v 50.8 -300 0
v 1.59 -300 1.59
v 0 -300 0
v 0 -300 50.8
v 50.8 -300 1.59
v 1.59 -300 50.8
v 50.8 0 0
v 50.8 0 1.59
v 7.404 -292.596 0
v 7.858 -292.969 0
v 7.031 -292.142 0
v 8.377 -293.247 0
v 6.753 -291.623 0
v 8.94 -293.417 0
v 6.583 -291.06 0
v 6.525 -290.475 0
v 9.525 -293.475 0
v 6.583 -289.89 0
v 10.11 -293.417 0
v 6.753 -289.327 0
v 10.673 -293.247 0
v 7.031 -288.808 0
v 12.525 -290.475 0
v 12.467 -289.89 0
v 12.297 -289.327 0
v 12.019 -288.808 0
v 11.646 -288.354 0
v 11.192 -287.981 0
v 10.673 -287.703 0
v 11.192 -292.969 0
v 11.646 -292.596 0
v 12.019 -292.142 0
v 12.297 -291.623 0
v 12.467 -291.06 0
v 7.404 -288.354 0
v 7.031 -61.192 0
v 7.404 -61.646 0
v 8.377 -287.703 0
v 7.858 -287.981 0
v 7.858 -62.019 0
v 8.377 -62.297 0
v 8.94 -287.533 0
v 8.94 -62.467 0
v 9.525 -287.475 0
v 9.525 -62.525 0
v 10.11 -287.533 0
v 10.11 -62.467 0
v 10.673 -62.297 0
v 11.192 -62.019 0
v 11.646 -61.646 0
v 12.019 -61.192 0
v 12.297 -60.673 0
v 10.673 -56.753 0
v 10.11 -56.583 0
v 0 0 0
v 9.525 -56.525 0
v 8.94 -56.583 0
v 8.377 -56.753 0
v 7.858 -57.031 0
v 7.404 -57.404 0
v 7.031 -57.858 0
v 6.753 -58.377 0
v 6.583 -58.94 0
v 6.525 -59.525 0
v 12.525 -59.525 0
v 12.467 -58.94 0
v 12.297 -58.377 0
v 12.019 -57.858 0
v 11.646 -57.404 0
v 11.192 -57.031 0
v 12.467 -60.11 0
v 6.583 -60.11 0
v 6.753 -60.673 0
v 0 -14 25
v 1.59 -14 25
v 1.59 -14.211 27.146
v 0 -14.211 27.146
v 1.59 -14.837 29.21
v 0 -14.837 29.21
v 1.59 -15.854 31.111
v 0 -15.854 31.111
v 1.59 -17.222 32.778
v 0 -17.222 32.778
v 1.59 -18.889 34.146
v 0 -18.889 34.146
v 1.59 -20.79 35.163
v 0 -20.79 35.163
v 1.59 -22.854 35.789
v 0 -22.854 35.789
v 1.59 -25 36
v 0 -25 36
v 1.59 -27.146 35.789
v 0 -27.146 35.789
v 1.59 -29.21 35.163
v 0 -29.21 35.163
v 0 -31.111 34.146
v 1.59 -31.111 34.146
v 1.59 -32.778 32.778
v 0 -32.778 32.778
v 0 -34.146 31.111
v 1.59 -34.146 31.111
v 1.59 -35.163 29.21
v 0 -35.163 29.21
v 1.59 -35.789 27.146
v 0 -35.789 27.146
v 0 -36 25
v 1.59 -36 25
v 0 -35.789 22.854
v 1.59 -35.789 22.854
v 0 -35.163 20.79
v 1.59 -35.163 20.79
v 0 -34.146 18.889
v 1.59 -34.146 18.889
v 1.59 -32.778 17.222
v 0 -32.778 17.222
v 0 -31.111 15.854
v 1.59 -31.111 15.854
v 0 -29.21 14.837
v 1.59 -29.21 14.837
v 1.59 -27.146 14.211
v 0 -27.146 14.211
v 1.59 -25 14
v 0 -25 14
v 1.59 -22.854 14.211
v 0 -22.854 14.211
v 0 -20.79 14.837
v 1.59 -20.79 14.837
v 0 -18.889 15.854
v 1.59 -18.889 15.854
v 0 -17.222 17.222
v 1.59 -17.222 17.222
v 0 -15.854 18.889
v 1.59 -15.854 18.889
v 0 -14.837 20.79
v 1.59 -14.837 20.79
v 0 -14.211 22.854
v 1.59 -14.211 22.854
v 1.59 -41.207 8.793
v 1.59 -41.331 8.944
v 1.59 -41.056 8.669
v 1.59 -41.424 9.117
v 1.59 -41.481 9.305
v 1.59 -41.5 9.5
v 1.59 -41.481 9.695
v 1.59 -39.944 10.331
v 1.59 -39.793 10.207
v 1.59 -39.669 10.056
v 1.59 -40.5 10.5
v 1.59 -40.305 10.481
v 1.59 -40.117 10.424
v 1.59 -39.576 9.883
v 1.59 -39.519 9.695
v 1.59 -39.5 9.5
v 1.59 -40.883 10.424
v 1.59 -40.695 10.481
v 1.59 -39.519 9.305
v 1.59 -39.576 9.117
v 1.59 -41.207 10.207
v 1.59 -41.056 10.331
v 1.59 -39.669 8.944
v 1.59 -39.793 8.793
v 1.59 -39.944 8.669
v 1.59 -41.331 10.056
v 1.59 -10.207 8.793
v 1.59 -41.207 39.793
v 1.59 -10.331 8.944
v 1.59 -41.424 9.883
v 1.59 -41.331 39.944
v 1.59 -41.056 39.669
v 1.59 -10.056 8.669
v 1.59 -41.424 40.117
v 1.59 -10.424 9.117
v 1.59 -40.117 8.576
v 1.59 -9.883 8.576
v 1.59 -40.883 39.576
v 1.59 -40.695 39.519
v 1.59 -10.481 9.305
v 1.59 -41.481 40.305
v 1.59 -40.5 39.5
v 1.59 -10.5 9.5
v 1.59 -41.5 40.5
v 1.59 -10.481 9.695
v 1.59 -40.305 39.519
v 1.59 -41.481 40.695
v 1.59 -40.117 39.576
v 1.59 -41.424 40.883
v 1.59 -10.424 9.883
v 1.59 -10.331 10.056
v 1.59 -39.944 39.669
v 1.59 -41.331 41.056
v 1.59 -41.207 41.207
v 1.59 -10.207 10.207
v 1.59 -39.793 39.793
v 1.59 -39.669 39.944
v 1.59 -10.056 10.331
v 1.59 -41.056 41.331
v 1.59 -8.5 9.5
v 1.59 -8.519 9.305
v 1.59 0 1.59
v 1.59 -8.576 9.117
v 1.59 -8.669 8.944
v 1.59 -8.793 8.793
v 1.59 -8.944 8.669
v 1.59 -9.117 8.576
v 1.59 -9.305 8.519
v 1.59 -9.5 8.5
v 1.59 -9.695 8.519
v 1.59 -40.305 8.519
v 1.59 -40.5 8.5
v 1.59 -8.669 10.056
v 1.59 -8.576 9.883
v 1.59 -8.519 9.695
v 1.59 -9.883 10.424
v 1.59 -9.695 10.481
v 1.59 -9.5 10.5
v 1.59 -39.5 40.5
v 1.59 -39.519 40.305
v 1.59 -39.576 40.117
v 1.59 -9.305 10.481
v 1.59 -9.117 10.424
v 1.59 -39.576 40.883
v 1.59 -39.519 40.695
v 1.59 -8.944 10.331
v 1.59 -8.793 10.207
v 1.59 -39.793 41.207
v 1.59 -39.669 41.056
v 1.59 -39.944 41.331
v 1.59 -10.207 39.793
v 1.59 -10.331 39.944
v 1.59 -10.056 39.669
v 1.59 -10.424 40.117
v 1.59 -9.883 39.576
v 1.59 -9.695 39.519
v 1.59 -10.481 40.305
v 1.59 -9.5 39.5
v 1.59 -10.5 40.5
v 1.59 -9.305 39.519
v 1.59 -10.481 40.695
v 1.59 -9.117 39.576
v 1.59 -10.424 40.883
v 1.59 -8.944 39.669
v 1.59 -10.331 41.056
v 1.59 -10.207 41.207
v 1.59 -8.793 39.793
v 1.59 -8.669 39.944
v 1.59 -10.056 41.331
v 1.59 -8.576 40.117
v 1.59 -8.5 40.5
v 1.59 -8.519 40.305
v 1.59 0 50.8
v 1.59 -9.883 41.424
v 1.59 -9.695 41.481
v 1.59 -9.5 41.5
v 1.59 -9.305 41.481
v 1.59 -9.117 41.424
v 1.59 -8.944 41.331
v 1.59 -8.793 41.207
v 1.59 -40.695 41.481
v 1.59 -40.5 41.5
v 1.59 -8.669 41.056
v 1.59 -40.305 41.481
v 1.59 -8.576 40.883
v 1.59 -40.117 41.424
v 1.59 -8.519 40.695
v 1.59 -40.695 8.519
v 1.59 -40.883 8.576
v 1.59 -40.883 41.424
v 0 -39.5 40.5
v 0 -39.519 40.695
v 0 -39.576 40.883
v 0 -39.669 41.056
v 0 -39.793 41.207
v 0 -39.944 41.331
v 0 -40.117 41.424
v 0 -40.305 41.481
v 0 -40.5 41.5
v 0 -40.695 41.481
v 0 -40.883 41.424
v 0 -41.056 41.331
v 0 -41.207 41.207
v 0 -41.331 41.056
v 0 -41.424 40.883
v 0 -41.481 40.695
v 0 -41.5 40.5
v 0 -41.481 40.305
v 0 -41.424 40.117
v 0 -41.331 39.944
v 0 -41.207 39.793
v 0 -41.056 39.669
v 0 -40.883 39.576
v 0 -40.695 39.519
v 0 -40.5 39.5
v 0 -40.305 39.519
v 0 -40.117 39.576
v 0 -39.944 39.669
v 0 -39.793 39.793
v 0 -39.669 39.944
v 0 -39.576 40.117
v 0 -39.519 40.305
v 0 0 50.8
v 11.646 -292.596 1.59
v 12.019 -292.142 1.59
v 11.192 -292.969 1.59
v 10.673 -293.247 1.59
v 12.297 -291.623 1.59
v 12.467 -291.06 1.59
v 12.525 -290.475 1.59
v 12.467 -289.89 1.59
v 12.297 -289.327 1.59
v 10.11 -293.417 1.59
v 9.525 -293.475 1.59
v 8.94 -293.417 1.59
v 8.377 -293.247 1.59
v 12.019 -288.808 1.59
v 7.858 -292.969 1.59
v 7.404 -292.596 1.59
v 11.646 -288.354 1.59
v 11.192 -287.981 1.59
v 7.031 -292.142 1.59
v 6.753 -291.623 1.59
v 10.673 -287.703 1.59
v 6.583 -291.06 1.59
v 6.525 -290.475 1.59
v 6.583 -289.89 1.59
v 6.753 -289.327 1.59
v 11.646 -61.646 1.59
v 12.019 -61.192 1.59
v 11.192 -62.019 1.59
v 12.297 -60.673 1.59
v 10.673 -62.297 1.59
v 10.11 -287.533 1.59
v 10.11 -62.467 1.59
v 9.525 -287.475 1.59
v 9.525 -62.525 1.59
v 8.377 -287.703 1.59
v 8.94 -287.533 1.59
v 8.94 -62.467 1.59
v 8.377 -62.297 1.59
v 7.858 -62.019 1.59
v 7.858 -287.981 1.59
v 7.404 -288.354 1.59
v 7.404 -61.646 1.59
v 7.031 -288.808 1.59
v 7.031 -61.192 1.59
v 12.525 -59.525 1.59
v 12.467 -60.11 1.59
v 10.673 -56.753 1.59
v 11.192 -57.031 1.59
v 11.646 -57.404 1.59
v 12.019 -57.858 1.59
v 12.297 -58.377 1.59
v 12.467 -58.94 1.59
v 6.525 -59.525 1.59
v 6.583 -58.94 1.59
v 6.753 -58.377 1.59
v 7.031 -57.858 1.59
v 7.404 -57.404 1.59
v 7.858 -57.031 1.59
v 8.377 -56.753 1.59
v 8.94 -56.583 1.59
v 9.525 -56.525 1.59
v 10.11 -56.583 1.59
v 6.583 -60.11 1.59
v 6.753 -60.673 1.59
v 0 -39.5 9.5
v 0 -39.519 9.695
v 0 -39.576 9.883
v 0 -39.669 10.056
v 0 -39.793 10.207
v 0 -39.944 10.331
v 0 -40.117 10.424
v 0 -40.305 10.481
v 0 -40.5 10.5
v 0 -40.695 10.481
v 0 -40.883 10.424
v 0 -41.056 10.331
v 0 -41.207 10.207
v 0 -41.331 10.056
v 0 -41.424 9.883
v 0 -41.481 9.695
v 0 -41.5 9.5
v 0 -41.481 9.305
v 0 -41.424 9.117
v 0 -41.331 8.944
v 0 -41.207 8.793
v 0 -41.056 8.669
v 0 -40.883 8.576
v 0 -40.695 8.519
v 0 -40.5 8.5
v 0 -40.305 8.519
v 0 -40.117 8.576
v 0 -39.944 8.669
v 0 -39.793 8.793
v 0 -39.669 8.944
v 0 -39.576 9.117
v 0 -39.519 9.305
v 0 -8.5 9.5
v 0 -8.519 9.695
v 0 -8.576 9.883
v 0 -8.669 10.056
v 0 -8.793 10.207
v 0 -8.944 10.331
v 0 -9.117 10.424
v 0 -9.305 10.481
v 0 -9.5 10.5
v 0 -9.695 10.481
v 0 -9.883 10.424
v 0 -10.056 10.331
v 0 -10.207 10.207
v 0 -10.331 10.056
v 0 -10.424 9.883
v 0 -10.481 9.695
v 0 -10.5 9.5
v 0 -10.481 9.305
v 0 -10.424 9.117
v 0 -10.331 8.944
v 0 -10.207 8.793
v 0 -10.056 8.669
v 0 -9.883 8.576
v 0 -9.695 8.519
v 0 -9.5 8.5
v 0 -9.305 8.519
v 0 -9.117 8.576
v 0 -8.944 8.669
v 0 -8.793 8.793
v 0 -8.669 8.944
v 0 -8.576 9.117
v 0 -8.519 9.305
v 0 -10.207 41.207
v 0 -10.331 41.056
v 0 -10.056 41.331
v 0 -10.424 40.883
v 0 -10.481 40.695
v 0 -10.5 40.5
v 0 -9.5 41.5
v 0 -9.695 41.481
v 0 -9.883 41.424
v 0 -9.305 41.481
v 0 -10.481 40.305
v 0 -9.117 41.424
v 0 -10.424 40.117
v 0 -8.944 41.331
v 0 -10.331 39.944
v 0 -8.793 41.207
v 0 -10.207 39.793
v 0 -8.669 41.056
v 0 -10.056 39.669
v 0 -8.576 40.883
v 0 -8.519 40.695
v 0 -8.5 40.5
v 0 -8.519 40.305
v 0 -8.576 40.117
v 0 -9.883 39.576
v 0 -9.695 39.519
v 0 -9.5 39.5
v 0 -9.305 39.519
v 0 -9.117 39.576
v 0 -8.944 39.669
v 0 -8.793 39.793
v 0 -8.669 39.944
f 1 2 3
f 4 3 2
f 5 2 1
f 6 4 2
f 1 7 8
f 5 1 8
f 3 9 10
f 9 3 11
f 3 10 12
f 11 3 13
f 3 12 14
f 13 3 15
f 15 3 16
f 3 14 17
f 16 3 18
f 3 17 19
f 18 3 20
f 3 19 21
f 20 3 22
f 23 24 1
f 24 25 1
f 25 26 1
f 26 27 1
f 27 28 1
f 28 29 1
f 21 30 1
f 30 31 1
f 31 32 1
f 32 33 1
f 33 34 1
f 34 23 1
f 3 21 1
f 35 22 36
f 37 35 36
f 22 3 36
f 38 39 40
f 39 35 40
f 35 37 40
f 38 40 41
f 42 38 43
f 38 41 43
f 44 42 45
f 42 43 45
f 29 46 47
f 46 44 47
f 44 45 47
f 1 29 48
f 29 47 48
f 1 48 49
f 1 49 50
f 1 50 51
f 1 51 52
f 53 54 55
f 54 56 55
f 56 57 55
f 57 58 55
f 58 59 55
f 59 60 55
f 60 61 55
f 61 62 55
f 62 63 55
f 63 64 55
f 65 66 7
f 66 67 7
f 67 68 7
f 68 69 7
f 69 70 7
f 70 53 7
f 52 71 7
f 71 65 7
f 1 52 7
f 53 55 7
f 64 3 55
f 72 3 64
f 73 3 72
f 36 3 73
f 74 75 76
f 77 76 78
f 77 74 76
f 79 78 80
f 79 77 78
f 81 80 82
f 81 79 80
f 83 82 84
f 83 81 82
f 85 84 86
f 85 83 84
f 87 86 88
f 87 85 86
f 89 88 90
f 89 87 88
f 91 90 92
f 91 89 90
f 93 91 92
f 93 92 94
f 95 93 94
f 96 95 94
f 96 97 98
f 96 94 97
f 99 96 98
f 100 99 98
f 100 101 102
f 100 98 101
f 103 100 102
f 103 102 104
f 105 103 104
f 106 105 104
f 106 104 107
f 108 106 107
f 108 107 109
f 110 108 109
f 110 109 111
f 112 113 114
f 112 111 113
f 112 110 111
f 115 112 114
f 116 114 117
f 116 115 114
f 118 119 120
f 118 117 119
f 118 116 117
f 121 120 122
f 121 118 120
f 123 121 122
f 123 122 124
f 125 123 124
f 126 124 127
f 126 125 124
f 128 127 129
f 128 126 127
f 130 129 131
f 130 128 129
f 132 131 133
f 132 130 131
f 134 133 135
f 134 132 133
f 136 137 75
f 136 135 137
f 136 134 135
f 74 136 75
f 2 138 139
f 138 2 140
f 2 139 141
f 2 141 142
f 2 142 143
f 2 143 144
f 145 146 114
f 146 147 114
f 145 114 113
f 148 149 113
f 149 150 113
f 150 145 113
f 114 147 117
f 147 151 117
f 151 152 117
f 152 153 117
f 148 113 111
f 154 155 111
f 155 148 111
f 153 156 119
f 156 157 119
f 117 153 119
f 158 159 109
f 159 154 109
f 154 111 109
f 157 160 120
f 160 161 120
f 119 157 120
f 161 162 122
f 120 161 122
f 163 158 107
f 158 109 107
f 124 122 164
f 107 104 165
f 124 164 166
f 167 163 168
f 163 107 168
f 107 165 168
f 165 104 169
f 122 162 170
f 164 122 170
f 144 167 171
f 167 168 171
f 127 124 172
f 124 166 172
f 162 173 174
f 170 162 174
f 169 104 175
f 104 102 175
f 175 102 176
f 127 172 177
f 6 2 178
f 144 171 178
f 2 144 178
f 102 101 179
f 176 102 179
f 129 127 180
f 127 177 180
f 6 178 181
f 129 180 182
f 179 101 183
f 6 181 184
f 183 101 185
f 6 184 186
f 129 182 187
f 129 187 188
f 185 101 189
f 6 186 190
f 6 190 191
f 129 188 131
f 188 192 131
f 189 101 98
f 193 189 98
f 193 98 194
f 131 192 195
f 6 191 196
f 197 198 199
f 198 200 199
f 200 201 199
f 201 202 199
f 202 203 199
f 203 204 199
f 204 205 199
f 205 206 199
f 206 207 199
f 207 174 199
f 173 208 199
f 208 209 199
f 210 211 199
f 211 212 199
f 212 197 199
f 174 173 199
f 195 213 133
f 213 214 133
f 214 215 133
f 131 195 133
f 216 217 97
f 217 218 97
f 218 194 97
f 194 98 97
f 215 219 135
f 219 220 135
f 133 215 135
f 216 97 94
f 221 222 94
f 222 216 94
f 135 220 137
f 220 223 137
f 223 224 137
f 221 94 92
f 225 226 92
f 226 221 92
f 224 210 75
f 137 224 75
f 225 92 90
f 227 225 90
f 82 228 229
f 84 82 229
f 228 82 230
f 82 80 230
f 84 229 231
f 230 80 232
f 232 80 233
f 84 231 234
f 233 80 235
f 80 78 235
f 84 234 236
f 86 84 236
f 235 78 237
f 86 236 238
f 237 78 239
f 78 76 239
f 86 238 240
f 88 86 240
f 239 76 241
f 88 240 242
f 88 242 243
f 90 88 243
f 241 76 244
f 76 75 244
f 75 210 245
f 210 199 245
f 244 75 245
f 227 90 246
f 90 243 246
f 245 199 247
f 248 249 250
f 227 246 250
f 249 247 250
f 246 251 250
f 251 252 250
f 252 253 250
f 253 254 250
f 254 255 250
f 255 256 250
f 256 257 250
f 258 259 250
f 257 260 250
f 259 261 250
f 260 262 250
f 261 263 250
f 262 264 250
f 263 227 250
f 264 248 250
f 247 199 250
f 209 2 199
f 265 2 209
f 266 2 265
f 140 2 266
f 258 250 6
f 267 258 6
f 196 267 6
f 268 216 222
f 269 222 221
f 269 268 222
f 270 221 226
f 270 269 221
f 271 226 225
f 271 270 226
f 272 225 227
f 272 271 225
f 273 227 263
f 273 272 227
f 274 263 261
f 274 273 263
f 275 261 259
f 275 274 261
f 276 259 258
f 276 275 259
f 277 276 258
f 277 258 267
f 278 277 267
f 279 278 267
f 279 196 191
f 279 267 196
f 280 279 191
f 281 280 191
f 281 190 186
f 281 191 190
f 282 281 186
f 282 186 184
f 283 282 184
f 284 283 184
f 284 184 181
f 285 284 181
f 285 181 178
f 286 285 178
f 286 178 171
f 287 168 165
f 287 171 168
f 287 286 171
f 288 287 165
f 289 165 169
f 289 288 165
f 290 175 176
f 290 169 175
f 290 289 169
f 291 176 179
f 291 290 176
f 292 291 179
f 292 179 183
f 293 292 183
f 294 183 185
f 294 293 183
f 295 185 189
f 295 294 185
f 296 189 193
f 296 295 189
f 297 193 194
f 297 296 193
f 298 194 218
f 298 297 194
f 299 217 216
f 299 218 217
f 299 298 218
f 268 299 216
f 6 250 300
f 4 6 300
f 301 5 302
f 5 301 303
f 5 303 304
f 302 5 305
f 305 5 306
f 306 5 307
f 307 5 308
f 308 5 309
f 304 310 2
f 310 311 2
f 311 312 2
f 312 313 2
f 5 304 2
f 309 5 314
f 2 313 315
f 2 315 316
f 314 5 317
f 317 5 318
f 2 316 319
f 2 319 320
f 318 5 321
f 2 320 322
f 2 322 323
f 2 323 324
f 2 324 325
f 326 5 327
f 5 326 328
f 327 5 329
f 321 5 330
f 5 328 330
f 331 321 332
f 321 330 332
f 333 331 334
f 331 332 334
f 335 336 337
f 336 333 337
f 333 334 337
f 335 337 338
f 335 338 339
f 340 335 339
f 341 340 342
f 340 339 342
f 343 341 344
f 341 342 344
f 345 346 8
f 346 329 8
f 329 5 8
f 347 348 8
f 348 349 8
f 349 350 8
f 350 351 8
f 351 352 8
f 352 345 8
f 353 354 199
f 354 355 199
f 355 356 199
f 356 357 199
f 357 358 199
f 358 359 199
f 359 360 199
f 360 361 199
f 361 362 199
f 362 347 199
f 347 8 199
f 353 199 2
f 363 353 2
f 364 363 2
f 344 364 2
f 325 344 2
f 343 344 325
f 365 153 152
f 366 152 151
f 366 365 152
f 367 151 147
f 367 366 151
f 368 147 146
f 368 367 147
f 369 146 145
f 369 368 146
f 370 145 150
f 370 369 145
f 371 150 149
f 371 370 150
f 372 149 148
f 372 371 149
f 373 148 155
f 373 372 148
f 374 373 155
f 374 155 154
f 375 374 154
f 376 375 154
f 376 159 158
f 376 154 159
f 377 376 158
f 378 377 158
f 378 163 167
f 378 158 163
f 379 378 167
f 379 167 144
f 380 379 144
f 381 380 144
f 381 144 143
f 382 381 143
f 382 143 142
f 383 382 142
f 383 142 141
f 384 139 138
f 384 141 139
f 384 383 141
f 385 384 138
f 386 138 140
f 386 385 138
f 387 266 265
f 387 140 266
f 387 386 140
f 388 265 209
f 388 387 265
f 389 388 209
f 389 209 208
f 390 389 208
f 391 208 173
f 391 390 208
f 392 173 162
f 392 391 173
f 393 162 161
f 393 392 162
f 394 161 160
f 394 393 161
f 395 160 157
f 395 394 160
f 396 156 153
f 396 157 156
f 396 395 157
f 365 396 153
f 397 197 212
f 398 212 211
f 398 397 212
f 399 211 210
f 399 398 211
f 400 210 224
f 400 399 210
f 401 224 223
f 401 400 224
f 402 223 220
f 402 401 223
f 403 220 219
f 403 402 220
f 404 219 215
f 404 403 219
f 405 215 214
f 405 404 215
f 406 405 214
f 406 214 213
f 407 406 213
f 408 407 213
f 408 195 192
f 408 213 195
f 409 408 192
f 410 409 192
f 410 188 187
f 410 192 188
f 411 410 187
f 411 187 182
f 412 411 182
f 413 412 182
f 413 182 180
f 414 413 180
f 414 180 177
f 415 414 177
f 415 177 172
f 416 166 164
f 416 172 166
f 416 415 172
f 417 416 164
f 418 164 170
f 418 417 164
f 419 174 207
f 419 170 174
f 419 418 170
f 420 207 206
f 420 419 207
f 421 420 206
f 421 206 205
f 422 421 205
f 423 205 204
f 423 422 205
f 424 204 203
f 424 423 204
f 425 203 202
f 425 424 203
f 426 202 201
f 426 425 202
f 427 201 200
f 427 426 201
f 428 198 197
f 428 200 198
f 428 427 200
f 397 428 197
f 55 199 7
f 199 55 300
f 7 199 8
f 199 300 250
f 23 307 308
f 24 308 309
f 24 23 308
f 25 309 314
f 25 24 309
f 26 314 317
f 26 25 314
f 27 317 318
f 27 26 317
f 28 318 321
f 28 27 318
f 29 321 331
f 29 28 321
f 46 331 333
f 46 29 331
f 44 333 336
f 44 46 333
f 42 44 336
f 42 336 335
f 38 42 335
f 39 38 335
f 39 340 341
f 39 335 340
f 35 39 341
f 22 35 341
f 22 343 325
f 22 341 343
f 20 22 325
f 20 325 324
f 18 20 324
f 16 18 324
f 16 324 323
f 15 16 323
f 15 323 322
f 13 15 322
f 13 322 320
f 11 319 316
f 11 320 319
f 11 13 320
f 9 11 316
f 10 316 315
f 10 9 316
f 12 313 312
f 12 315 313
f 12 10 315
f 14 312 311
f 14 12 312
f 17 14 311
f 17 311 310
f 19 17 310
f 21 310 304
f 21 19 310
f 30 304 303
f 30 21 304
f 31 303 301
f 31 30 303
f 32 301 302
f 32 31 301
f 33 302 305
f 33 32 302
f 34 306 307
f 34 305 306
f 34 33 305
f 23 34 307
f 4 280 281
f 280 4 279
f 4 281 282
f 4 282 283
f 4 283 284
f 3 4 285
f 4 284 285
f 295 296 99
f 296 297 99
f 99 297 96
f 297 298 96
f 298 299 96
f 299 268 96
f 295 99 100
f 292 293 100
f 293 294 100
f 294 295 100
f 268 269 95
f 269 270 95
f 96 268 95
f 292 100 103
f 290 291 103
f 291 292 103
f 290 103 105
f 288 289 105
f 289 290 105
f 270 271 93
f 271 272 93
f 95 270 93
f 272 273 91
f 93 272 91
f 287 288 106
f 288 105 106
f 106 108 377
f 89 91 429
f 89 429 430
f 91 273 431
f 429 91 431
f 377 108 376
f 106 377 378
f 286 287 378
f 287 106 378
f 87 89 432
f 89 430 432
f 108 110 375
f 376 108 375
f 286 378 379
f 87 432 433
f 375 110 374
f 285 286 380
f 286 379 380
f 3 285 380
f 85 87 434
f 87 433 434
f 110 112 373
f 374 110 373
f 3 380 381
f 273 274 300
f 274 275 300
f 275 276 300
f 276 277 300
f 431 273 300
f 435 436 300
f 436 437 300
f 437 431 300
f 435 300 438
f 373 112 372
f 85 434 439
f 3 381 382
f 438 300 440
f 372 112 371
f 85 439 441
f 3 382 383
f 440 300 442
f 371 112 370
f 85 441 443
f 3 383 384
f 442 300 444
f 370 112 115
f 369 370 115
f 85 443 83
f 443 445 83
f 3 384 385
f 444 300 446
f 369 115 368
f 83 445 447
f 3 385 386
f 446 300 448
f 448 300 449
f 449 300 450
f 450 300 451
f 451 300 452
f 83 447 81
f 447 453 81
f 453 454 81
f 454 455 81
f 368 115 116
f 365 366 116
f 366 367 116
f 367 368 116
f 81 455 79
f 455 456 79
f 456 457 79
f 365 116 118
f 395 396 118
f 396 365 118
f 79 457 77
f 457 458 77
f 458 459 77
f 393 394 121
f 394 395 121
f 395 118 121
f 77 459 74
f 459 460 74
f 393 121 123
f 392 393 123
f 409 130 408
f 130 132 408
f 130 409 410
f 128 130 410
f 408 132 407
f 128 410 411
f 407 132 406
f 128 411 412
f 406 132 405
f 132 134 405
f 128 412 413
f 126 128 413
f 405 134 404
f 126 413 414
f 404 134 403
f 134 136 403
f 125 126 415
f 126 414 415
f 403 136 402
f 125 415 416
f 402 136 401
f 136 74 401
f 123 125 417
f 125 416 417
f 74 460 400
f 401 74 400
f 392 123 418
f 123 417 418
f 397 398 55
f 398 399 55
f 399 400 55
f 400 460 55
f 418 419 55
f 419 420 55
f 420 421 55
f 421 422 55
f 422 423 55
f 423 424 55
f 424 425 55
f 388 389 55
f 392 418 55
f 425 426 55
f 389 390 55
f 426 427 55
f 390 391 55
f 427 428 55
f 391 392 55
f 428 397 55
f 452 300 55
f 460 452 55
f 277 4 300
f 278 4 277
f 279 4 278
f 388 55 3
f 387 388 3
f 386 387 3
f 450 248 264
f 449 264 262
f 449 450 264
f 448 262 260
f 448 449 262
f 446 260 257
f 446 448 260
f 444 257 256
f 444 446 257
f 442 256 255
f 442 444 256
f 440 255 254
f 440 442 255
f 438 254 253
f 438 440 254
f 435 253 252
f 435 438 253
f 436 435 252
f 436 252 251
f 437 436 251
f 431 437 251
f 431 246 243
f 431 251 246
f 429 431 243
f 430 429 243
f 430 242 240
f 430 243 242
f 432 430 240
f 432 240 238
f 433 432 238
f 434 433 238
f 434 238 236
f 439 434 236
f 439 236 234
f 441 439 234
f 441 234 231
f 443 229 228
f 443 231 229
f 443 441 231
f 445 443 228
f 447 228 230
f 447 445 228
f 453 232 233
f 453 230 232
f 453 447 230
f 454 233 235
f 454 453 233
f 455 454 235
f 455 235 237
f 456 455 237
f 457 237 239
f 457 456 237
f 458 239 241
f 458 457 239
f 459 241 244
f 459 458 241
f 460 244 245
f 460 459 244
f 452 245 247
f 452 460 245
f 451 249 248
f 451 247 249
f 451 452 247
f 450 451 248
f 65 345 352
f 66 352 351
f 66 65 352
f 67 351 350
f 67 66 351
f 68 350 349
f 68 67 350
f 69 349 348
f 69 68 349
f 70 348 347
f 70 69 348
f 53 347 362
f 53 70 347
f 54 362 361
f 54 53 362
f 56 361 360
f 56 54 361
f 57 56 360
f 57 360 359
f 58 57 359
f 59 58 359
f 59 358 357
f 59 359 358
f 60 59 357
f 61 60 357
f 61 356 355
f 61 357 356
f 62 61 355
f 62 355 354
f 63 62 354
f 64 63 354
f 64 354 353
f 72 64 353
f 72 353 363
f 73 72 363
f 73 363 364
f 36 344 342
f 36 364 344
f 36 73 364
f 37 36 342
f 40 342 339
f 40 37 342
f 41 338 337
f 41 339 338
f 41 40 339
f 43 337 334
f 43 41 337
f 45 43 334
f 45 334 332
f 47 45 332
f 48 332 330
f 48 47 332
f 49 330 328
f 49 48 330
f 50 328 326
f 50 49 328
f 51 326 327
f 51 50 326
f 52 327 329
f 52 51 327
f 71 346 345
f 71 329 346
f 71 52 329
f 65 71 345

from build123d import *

# Parameters (mm, degrees)
F1_DEPTH = 300
F2_R     = 3
F3_DEPTH = 50.801
F4_R     = 11
F4_R_2   = 1
F5_DEPTH = 50.801


with BuildPart() as f1:
    # F0 (on Front) → F1 (new body)
    with BuildSketch(Plane.XZ):
        Polygon((0, 50.8), (0, 0), (50.8, 0), (50.8, 1.59), (1.59, 1.59), (1.59, 50.8), align=None)
    extrude(amount=F1_DEPTH)

    # F2 (on Top) → F3 (cut, through all)
    with BuildSketch(Plane.XY):
        with Locations((9.525, -59.525)):
            Circle(F2_R)
        with Locations((9.525, -290.475)):
            Circle(F2_R)
    extrude(amount=F3_DEPTH, mode=Mode.SUBTRACT)

    # F4 (on Right) → F5 (cut, through all)
    with BuildSketch(Plane.YZ):
        with Locations((-25, 25)):
            Circle(F4_R)
        with Locations((-40.5, 9.5)):
            Circle(F4_R_2)
        with Locations((-9.5, 9.5)):
            Circle(F4_R_2)
        with Locations((-9.5, 40.5)):
            Circle(F4_R_2)
        with Locations((-40.5, 40.5)):
            Circle(F4_R_2)
    extrude(amount=F5_DEPTH, mode=Mode.SUBTRACT)


solid = f1.part
